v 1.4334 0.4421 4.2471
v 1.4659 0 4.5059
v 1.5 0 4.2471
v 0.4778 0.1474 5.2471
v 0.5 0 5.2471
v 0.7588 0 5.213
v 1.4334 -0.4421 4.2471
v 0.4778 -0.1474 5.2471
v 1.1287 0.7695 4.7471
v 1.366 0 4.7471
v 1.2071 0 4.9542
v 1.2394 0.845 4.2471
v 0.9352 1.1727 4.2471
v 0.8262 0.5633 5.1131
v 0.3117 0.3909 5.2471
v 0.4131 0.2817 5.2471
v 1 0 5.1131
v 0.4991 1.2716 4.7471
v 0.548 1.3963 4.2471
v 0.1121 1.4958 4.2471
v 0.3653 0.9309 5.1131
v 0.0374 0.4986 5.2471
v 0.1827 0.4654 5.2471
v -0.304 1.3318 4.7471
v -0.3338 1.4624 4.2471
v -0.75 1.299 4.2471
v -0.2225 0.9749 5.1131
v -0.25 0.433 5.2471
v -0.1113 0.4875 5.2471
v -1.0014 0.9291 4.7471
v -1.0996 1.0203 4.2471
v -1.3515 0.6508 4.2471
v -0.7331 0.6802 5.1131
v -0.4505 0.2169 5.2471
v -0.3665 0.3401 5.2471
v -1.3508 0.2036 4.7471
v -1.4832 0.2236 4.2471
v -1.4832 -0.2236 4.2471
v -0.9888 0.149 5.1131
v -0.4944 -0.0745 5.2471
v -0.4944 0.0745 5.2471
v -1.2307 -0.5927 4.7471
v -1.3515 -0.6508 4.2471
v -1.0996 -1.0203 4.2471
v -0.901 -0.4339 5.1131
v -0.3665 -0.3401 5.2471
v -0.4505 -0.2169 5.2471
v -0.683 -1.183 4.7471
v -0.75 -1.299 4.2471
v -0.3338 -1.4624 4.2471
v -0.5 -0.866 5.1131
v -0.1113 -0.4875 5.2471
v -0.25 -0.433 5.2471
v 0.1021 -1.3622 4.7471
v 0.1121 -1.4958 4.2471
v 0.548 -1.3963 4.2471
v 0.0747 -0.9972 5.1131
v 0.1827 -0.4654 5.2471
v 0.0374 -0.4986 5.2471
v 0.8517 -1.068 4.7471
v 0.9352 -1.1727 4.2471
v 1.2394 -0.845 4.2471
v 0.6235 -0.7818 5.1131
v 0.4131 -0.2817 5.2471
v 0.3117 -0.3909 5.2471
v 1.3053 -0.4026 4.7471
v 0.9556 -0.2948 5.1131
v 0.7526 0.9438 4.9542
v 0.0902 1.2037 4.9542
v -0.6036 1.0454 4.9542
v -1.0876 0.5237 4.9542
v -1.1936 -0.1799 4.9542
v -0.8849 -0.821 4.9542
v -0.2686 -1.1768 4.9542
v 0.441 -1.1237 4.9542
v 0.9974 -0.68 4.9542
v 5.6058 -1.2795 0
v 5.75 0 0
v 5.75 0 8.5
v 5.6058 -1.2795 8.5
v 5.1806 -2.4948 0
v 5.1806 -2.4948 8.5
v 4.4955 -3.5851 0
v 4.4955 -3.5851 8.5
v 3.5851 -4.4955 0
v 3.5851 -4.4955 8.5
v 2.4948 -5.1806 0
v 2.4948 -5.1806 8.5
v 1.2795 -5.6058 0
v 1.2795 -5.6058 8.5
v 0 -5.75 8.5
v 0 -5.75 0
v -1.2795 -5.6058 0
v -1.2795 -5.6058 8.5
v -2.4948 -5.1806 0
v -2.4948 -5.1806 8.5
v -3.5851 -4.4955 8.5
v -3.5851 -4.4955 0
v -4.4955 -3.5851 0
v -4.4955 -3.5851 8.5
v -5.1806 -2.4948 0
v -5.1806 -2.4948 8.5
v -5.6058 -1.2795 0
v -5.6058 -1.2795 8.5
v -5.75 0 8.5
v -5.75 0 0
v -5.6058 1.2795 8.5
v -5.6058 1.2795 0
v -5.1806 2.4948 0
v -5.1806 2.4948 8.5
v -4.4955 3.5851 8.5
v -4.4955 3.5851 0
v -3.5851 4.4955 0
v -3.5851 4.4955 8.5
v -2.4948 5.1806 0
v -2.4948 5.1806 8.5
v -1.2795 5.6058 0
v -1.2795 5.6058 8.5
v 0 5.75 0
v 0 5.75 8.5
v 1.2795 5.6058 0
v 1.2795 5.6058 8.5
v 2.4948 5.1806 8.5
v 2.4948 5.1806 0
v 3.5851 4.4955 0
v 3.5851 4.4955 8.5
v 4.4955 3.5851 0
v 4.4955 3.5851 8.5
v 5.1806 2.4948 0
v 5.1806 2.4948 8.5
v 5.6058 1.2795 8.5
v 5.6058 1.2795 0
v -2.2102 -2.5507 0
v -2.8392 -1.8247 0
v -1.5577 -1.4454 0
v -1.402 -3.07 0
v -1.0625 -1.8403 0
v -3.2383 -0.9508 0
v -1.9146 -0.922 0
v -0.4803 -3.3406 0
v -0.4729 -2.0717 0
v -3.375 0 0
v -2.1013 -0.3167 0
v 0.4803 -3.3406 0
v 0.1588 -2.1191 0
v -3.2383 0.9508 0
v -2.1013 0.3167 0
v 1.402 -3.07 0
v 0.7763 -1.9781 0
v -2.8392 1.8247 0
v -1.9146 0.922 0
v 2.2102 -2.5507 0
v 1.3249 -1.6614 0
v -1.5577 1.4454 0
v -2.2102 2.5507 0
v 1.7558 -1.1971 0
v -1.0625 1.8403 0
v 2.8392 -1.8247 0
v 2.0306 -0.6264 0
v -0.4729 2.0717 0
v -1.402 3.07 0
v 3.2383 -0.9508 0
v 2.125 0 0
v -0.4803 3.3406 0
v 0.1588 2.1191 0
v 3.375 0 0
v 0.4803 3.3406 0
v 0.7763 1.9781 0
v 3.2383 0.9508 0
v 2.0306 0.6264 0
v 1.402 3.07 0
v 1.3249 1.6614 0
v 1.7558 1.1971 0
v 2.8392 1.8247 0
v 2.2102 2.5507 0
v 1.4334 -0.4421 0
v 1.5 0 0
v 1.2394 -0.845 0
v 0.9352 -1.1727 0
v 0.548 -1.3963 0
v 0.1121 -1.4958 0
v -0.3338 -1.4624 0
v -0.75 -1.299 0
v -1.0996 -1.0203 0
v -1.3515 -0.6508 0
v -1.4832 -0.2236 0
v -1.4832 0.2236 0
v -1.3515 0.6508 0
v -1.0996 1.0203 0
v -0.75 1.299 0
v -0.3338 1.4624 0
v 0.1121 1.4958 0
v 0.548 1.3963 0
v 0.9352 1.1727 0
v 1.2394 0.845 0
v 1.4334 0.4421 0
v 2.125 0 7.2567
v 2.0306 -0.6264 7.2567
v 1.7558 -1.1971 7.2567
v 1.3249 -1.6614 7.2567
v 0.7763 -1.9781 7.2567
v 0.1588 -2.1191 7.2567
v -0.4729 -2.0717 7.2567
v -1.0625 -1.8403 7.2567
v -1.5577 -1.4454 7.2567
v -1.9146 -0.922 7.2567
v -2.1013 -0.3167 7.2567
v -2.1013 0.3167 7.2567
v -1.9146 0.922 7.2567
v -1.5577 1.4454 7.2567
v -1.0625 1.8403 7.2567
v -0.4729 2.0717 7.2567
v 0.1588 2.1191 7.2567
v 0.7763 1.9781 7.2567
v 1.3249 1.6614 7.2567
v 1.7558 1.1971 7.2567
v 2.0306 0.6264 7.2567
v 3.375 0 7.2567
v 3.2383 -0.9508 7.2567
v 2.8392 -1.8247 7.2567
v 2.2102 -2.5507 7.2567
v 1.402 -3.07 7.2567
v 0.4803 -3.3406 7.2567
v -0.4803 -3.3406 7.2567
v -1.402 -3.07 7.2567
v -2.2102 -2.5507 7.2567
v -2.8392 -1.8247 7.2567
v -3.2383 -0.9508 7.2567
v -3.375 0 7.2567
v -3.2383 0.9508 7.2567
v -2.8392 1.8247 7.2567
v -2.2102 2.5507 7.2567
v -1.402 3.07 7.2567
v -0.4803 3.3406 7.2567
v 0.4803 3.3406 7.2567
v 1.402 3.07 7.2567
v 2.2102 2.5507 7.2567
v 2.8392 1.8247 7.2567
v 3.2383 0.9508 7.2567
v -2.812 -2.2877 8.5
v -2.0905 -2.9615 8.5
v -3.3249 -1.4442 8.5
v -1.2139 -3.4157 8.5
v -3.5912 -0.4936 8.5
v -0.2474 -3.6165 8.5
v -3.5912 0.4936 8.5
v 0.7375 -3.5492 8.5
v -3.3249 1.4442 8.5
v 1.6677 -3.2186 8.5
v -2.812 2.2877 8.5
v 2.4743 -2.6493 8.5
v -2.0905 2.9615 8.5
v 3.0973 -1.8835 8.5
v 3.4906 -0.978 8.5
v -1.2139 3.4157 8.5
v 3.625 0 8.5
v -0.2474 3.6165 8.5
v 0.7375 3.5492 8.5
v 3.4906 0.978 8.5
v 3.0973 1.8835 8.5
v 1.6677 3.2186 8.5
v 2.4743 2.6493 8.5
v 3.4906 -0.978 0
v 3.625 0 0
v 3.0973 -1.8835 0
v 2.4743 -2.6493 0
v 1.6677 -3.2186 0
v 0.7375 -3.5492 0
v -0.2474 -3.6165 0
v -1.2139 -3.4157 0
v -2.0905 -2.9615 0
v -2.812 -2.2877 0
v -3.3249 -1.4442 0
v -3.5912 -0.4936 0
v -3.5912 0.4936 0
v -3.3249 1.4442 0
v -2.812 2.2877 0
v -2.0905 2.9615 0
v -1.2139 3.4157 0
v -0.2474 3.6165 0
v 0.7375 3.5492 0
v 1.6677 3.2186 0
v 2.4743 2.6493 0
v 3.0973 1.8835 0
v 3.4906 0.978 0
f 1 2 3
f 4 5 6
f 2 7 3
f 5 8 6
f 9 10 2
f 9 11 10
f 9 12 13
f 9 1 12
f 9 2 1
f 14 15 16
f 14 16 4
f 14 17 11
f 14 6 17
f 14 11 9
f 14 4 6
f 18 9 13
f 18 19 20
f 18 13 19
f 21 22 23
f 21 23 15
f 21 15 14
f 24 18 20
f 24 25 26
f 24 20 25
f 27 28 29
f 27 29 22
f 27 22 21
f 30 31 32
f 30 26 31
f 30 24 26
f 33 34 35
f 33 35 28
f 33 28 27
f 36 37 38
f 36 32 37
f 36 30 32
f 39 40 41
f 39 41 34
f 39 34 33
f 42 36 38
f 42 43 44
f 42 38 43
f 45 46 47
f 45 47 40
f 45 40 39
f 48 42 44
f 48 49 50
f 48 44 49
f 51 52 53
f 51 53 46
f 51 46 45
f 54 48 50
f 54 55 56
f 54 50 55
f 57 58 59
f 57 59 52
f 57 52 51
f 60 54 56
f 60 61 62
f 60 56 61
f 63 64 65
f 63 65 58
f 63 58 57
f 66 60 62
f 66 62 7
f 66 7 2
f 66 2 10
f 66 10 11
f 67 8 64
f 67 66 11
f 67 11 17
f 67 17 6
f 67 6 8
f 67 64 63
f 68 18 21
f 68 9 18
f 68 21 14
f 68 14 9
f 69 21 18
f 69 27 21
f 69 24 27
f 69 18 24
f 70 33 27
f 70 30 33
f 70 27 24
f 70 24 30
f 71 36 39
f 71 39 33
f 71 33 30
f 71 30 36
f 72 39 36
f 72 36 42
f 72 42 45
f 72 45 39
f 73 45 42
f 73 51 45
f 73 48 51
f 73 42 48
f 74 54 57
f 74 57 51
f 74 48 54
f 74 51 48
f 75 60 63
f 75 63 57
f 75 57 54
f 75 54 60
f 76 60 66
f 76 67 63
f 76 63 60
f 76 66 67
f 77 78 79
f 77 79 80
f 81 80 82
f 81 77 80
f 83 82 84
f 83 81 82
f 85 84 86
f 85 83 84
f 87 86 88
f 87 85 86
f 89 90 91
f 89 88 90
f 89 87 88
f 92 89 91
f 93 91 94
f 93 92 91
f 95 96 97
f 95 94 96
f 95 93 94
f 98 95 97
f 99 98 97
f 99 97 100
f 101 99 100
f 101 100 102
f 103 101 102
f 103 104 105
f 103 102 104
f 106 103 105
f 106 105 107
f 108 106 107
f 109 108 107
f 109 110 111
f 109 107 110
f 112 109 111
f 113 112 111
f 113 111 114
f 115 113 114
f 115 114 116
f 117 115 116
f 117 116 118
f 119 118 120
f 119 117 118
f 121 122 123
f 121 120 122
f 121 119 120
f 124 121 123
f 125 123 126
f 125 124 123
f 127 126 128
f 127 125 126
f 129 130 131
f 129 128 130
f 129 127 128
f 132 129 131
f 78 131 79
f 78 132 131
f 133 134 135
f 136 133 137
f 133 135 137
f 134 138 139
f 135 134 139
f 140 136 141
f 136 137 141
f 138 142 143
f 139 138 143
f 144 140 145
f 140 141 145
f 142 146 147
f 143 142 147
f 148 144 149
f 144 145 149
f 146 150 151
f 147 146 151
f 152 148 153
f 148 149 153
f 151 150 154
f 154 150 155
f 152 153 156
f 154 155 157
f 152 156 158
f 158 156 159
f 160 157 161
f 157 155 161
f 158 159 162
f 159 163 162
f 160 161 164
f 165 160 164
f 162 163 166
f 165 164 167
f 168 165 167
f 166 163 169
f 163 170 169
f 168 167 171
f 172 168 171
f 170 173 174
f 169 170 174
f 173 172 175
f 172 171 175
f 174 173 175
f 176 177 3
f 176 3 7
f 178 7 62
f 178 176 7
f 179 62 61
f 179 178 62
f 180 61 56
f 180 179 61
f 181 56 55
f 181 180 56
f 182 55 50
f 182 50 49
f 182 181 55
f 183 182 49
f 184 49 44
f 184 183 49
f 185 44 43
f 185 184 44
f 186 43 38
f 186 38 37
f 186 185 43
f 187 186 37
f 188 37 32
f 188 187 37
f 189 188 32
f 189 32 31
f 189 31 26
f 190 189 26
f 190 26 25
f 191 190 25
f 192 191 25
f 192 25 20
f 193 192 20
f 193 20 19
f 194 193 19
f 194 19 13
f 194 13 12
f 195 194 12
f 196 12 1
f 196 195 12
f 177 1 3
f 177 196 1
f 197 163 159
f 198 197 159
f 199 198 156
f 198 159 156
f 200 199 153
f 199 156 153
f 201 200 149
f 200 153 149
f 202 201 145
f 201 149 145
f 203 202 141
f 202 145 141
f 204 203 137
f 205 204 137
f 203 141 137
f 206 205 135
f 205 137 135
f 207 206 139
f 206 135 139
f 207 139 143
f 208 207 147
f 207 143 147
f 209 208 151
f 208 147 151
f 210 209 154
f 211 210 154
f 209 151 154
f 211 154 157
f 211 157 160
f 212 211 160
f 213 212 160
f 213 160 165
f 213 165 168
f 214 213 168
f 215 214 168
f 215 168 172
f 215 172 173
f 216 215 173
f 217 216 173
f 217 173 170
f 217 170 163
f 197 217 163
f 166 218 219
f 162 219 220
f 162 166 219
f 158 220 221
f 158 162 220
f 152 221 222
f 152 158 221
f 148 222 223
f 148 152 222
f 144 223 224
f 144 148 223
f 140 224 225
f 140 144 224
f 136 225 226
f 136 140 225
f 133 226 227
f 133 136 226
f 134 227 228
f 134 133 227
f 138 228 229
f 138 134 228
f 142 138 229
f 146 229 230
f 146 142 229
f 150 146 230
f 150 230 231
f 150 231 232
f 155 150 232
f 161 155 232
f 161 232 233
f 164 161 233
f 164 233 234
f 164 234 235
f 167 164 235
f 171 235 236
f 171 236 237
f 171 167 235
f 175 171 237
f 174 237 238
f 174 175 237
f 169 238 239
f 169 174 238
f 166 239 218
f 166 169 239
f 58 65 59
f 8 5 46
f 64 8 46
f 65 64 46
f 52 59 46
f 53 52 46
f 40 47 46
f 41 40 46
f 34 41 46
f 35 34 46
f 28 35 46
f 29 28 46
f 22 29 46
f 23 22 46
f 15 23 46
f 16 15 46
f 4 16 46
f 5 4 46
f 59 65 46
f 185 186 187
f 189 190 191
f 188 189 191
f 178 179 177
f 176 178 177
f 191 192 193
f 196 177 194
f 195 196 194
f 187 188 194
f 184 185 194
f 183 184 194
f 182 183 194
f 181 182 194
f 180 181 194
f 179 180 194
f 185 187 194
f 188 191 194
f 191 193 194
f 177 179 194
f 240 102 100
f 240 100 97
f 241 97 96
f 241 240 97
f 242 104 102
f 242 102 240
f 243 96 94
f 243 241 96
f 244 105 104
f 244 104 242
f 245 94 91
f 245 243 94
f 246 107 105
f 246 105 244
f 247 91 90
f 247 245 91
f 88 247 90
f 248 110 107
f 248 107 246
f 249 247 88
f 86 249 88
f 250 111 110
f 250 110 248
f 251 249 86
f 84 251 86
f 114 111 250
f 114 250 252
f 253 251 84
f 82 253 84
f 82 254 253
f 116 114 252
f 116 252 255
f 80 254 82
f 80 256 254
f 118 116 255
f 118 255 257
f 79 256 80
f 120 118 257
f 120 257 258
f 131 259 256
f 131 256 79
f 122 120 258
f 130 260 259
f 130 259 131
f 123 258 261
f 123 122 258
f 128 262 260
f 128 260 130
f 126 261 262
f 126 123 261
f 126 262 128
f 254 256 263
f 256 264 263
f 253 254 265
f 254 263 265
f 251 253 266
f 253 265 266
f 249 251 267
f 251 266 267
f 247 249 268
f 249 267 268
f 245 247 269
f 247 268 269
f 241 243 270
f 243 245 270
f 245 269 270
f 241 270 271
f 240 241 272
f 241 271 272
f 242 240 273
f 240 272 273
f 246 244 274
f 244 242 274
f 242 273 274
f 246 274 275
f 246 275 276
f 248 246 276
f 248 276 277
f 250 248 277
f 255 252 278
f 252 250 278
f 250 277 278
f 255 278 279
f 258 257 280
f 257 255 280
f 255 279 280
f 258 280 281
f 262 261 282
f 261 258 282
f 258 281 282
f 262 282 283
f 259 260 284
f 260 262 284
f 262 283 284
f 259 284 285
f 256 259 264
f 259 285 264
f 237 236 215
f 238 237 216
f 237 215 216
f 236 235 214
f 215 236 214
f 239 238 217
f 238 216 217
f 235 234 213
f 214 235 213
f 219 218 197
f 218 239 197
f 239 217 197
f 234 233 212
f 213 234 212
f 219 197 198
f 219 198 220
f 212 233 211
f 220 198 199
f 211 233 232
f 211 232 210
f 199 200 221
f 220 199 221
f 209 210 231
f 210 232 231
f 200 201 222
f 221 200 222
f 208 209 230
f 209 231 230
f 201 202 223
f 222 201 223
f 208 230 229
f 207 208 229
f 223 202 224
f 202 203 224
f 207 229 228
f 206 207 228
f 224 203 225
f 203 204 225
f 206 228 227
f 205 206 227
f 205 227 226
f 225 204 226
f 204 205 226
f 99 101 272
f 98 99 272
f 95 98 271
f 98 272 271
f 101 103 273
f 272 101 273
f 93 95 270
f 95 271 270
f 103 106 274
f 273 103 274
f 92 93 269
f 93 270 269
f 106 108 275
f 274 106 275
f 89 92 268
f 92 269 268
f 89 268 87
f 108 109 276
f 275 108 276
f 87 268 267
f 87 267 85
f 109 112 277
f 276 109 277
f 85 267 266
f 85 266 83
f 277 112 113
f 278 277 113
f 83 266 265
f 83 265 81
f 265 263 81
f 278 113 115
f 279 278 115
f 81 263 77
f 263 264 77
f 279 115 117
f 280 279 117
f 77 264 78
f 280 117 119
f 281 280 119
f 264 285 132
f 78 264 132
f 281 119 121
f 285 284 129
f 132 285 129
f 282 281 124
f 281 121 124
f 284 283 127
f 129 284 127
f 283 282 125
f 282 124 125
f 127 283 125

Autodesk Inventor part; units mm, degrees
ref_plane "YZ Plane" through (0, 0, 0) normal (1, 0, 0) x (0, 1, 0)
ref_plane "XZ Plane" through (0, 0, 0) normal (0, 1, 0) x (-1, 0, 0)
ref_plane "XY Plane" through (0, 0, 0) normal (0, 0, 1) x (1, 0, 0)
sketch "Sketch1" plane through (0, 0, 0) normal (0, 0, 1) x (1, 0, 0)
  circle A0 centre (0, 0) radius 1.5
  circle A1 centre (0, 0) radius 2.125
  circle A2 centre (0, 0) radius 3.375
  circle A3 centre (0, 0) radius 3.625
  circle A4 centre (0, 0) radius 5.75
  dimension "d0" = 3
  dimension "d1" = 4.25
  dimension "d2" = 6.75
  dimension "d3" = 7.25
  dimension "d4" = 11.5
extrude "Extrusion1" add sketch "Sketch1" along normal blind 8.5
sketch "Sketch2" plane through (0, 0, 0) normal (1, 0, 0) x (0, 1, 0)
  line L0 (-1.5, 8.5) -> (1.5, 8.5) construction
  line L1 (-3.4583, 7.2567) -> (-1.856, 7.2567) construction
  line L2 (-1.856, 7.2567) -> (-1.856, 5.2471) construction
  line L3 (-1.856, 5.2471) -> (0, 5.2471) construction
  line L4 (-3.4583, 7.2567) -> (-3.4583, 8.9404)
  line L5 (-3.4583, 8.9404) -> (0, 8.9404)
  line L6 (0, 8.9404) -> (0, 5.2471)
  line L7 (0, 5.2471) -> (-1.856, 5.2471)
  line L8 (-1.856, 5.2471) -> (-1.856, 7.2567)
  line L9 (-1.856, 7.2567) -> (-3.4583, 7.2567)
  point P0 (0, 0)
revolve "Revolution1" cut sketch "Sketch2" angle 360 about axis through (0, 0, 8.9404) along (0, 0, -1)
fillet "Fillet1" radius 1 1 edges at (-1.5, 0, 5.2471)
properties part number "staklence"
